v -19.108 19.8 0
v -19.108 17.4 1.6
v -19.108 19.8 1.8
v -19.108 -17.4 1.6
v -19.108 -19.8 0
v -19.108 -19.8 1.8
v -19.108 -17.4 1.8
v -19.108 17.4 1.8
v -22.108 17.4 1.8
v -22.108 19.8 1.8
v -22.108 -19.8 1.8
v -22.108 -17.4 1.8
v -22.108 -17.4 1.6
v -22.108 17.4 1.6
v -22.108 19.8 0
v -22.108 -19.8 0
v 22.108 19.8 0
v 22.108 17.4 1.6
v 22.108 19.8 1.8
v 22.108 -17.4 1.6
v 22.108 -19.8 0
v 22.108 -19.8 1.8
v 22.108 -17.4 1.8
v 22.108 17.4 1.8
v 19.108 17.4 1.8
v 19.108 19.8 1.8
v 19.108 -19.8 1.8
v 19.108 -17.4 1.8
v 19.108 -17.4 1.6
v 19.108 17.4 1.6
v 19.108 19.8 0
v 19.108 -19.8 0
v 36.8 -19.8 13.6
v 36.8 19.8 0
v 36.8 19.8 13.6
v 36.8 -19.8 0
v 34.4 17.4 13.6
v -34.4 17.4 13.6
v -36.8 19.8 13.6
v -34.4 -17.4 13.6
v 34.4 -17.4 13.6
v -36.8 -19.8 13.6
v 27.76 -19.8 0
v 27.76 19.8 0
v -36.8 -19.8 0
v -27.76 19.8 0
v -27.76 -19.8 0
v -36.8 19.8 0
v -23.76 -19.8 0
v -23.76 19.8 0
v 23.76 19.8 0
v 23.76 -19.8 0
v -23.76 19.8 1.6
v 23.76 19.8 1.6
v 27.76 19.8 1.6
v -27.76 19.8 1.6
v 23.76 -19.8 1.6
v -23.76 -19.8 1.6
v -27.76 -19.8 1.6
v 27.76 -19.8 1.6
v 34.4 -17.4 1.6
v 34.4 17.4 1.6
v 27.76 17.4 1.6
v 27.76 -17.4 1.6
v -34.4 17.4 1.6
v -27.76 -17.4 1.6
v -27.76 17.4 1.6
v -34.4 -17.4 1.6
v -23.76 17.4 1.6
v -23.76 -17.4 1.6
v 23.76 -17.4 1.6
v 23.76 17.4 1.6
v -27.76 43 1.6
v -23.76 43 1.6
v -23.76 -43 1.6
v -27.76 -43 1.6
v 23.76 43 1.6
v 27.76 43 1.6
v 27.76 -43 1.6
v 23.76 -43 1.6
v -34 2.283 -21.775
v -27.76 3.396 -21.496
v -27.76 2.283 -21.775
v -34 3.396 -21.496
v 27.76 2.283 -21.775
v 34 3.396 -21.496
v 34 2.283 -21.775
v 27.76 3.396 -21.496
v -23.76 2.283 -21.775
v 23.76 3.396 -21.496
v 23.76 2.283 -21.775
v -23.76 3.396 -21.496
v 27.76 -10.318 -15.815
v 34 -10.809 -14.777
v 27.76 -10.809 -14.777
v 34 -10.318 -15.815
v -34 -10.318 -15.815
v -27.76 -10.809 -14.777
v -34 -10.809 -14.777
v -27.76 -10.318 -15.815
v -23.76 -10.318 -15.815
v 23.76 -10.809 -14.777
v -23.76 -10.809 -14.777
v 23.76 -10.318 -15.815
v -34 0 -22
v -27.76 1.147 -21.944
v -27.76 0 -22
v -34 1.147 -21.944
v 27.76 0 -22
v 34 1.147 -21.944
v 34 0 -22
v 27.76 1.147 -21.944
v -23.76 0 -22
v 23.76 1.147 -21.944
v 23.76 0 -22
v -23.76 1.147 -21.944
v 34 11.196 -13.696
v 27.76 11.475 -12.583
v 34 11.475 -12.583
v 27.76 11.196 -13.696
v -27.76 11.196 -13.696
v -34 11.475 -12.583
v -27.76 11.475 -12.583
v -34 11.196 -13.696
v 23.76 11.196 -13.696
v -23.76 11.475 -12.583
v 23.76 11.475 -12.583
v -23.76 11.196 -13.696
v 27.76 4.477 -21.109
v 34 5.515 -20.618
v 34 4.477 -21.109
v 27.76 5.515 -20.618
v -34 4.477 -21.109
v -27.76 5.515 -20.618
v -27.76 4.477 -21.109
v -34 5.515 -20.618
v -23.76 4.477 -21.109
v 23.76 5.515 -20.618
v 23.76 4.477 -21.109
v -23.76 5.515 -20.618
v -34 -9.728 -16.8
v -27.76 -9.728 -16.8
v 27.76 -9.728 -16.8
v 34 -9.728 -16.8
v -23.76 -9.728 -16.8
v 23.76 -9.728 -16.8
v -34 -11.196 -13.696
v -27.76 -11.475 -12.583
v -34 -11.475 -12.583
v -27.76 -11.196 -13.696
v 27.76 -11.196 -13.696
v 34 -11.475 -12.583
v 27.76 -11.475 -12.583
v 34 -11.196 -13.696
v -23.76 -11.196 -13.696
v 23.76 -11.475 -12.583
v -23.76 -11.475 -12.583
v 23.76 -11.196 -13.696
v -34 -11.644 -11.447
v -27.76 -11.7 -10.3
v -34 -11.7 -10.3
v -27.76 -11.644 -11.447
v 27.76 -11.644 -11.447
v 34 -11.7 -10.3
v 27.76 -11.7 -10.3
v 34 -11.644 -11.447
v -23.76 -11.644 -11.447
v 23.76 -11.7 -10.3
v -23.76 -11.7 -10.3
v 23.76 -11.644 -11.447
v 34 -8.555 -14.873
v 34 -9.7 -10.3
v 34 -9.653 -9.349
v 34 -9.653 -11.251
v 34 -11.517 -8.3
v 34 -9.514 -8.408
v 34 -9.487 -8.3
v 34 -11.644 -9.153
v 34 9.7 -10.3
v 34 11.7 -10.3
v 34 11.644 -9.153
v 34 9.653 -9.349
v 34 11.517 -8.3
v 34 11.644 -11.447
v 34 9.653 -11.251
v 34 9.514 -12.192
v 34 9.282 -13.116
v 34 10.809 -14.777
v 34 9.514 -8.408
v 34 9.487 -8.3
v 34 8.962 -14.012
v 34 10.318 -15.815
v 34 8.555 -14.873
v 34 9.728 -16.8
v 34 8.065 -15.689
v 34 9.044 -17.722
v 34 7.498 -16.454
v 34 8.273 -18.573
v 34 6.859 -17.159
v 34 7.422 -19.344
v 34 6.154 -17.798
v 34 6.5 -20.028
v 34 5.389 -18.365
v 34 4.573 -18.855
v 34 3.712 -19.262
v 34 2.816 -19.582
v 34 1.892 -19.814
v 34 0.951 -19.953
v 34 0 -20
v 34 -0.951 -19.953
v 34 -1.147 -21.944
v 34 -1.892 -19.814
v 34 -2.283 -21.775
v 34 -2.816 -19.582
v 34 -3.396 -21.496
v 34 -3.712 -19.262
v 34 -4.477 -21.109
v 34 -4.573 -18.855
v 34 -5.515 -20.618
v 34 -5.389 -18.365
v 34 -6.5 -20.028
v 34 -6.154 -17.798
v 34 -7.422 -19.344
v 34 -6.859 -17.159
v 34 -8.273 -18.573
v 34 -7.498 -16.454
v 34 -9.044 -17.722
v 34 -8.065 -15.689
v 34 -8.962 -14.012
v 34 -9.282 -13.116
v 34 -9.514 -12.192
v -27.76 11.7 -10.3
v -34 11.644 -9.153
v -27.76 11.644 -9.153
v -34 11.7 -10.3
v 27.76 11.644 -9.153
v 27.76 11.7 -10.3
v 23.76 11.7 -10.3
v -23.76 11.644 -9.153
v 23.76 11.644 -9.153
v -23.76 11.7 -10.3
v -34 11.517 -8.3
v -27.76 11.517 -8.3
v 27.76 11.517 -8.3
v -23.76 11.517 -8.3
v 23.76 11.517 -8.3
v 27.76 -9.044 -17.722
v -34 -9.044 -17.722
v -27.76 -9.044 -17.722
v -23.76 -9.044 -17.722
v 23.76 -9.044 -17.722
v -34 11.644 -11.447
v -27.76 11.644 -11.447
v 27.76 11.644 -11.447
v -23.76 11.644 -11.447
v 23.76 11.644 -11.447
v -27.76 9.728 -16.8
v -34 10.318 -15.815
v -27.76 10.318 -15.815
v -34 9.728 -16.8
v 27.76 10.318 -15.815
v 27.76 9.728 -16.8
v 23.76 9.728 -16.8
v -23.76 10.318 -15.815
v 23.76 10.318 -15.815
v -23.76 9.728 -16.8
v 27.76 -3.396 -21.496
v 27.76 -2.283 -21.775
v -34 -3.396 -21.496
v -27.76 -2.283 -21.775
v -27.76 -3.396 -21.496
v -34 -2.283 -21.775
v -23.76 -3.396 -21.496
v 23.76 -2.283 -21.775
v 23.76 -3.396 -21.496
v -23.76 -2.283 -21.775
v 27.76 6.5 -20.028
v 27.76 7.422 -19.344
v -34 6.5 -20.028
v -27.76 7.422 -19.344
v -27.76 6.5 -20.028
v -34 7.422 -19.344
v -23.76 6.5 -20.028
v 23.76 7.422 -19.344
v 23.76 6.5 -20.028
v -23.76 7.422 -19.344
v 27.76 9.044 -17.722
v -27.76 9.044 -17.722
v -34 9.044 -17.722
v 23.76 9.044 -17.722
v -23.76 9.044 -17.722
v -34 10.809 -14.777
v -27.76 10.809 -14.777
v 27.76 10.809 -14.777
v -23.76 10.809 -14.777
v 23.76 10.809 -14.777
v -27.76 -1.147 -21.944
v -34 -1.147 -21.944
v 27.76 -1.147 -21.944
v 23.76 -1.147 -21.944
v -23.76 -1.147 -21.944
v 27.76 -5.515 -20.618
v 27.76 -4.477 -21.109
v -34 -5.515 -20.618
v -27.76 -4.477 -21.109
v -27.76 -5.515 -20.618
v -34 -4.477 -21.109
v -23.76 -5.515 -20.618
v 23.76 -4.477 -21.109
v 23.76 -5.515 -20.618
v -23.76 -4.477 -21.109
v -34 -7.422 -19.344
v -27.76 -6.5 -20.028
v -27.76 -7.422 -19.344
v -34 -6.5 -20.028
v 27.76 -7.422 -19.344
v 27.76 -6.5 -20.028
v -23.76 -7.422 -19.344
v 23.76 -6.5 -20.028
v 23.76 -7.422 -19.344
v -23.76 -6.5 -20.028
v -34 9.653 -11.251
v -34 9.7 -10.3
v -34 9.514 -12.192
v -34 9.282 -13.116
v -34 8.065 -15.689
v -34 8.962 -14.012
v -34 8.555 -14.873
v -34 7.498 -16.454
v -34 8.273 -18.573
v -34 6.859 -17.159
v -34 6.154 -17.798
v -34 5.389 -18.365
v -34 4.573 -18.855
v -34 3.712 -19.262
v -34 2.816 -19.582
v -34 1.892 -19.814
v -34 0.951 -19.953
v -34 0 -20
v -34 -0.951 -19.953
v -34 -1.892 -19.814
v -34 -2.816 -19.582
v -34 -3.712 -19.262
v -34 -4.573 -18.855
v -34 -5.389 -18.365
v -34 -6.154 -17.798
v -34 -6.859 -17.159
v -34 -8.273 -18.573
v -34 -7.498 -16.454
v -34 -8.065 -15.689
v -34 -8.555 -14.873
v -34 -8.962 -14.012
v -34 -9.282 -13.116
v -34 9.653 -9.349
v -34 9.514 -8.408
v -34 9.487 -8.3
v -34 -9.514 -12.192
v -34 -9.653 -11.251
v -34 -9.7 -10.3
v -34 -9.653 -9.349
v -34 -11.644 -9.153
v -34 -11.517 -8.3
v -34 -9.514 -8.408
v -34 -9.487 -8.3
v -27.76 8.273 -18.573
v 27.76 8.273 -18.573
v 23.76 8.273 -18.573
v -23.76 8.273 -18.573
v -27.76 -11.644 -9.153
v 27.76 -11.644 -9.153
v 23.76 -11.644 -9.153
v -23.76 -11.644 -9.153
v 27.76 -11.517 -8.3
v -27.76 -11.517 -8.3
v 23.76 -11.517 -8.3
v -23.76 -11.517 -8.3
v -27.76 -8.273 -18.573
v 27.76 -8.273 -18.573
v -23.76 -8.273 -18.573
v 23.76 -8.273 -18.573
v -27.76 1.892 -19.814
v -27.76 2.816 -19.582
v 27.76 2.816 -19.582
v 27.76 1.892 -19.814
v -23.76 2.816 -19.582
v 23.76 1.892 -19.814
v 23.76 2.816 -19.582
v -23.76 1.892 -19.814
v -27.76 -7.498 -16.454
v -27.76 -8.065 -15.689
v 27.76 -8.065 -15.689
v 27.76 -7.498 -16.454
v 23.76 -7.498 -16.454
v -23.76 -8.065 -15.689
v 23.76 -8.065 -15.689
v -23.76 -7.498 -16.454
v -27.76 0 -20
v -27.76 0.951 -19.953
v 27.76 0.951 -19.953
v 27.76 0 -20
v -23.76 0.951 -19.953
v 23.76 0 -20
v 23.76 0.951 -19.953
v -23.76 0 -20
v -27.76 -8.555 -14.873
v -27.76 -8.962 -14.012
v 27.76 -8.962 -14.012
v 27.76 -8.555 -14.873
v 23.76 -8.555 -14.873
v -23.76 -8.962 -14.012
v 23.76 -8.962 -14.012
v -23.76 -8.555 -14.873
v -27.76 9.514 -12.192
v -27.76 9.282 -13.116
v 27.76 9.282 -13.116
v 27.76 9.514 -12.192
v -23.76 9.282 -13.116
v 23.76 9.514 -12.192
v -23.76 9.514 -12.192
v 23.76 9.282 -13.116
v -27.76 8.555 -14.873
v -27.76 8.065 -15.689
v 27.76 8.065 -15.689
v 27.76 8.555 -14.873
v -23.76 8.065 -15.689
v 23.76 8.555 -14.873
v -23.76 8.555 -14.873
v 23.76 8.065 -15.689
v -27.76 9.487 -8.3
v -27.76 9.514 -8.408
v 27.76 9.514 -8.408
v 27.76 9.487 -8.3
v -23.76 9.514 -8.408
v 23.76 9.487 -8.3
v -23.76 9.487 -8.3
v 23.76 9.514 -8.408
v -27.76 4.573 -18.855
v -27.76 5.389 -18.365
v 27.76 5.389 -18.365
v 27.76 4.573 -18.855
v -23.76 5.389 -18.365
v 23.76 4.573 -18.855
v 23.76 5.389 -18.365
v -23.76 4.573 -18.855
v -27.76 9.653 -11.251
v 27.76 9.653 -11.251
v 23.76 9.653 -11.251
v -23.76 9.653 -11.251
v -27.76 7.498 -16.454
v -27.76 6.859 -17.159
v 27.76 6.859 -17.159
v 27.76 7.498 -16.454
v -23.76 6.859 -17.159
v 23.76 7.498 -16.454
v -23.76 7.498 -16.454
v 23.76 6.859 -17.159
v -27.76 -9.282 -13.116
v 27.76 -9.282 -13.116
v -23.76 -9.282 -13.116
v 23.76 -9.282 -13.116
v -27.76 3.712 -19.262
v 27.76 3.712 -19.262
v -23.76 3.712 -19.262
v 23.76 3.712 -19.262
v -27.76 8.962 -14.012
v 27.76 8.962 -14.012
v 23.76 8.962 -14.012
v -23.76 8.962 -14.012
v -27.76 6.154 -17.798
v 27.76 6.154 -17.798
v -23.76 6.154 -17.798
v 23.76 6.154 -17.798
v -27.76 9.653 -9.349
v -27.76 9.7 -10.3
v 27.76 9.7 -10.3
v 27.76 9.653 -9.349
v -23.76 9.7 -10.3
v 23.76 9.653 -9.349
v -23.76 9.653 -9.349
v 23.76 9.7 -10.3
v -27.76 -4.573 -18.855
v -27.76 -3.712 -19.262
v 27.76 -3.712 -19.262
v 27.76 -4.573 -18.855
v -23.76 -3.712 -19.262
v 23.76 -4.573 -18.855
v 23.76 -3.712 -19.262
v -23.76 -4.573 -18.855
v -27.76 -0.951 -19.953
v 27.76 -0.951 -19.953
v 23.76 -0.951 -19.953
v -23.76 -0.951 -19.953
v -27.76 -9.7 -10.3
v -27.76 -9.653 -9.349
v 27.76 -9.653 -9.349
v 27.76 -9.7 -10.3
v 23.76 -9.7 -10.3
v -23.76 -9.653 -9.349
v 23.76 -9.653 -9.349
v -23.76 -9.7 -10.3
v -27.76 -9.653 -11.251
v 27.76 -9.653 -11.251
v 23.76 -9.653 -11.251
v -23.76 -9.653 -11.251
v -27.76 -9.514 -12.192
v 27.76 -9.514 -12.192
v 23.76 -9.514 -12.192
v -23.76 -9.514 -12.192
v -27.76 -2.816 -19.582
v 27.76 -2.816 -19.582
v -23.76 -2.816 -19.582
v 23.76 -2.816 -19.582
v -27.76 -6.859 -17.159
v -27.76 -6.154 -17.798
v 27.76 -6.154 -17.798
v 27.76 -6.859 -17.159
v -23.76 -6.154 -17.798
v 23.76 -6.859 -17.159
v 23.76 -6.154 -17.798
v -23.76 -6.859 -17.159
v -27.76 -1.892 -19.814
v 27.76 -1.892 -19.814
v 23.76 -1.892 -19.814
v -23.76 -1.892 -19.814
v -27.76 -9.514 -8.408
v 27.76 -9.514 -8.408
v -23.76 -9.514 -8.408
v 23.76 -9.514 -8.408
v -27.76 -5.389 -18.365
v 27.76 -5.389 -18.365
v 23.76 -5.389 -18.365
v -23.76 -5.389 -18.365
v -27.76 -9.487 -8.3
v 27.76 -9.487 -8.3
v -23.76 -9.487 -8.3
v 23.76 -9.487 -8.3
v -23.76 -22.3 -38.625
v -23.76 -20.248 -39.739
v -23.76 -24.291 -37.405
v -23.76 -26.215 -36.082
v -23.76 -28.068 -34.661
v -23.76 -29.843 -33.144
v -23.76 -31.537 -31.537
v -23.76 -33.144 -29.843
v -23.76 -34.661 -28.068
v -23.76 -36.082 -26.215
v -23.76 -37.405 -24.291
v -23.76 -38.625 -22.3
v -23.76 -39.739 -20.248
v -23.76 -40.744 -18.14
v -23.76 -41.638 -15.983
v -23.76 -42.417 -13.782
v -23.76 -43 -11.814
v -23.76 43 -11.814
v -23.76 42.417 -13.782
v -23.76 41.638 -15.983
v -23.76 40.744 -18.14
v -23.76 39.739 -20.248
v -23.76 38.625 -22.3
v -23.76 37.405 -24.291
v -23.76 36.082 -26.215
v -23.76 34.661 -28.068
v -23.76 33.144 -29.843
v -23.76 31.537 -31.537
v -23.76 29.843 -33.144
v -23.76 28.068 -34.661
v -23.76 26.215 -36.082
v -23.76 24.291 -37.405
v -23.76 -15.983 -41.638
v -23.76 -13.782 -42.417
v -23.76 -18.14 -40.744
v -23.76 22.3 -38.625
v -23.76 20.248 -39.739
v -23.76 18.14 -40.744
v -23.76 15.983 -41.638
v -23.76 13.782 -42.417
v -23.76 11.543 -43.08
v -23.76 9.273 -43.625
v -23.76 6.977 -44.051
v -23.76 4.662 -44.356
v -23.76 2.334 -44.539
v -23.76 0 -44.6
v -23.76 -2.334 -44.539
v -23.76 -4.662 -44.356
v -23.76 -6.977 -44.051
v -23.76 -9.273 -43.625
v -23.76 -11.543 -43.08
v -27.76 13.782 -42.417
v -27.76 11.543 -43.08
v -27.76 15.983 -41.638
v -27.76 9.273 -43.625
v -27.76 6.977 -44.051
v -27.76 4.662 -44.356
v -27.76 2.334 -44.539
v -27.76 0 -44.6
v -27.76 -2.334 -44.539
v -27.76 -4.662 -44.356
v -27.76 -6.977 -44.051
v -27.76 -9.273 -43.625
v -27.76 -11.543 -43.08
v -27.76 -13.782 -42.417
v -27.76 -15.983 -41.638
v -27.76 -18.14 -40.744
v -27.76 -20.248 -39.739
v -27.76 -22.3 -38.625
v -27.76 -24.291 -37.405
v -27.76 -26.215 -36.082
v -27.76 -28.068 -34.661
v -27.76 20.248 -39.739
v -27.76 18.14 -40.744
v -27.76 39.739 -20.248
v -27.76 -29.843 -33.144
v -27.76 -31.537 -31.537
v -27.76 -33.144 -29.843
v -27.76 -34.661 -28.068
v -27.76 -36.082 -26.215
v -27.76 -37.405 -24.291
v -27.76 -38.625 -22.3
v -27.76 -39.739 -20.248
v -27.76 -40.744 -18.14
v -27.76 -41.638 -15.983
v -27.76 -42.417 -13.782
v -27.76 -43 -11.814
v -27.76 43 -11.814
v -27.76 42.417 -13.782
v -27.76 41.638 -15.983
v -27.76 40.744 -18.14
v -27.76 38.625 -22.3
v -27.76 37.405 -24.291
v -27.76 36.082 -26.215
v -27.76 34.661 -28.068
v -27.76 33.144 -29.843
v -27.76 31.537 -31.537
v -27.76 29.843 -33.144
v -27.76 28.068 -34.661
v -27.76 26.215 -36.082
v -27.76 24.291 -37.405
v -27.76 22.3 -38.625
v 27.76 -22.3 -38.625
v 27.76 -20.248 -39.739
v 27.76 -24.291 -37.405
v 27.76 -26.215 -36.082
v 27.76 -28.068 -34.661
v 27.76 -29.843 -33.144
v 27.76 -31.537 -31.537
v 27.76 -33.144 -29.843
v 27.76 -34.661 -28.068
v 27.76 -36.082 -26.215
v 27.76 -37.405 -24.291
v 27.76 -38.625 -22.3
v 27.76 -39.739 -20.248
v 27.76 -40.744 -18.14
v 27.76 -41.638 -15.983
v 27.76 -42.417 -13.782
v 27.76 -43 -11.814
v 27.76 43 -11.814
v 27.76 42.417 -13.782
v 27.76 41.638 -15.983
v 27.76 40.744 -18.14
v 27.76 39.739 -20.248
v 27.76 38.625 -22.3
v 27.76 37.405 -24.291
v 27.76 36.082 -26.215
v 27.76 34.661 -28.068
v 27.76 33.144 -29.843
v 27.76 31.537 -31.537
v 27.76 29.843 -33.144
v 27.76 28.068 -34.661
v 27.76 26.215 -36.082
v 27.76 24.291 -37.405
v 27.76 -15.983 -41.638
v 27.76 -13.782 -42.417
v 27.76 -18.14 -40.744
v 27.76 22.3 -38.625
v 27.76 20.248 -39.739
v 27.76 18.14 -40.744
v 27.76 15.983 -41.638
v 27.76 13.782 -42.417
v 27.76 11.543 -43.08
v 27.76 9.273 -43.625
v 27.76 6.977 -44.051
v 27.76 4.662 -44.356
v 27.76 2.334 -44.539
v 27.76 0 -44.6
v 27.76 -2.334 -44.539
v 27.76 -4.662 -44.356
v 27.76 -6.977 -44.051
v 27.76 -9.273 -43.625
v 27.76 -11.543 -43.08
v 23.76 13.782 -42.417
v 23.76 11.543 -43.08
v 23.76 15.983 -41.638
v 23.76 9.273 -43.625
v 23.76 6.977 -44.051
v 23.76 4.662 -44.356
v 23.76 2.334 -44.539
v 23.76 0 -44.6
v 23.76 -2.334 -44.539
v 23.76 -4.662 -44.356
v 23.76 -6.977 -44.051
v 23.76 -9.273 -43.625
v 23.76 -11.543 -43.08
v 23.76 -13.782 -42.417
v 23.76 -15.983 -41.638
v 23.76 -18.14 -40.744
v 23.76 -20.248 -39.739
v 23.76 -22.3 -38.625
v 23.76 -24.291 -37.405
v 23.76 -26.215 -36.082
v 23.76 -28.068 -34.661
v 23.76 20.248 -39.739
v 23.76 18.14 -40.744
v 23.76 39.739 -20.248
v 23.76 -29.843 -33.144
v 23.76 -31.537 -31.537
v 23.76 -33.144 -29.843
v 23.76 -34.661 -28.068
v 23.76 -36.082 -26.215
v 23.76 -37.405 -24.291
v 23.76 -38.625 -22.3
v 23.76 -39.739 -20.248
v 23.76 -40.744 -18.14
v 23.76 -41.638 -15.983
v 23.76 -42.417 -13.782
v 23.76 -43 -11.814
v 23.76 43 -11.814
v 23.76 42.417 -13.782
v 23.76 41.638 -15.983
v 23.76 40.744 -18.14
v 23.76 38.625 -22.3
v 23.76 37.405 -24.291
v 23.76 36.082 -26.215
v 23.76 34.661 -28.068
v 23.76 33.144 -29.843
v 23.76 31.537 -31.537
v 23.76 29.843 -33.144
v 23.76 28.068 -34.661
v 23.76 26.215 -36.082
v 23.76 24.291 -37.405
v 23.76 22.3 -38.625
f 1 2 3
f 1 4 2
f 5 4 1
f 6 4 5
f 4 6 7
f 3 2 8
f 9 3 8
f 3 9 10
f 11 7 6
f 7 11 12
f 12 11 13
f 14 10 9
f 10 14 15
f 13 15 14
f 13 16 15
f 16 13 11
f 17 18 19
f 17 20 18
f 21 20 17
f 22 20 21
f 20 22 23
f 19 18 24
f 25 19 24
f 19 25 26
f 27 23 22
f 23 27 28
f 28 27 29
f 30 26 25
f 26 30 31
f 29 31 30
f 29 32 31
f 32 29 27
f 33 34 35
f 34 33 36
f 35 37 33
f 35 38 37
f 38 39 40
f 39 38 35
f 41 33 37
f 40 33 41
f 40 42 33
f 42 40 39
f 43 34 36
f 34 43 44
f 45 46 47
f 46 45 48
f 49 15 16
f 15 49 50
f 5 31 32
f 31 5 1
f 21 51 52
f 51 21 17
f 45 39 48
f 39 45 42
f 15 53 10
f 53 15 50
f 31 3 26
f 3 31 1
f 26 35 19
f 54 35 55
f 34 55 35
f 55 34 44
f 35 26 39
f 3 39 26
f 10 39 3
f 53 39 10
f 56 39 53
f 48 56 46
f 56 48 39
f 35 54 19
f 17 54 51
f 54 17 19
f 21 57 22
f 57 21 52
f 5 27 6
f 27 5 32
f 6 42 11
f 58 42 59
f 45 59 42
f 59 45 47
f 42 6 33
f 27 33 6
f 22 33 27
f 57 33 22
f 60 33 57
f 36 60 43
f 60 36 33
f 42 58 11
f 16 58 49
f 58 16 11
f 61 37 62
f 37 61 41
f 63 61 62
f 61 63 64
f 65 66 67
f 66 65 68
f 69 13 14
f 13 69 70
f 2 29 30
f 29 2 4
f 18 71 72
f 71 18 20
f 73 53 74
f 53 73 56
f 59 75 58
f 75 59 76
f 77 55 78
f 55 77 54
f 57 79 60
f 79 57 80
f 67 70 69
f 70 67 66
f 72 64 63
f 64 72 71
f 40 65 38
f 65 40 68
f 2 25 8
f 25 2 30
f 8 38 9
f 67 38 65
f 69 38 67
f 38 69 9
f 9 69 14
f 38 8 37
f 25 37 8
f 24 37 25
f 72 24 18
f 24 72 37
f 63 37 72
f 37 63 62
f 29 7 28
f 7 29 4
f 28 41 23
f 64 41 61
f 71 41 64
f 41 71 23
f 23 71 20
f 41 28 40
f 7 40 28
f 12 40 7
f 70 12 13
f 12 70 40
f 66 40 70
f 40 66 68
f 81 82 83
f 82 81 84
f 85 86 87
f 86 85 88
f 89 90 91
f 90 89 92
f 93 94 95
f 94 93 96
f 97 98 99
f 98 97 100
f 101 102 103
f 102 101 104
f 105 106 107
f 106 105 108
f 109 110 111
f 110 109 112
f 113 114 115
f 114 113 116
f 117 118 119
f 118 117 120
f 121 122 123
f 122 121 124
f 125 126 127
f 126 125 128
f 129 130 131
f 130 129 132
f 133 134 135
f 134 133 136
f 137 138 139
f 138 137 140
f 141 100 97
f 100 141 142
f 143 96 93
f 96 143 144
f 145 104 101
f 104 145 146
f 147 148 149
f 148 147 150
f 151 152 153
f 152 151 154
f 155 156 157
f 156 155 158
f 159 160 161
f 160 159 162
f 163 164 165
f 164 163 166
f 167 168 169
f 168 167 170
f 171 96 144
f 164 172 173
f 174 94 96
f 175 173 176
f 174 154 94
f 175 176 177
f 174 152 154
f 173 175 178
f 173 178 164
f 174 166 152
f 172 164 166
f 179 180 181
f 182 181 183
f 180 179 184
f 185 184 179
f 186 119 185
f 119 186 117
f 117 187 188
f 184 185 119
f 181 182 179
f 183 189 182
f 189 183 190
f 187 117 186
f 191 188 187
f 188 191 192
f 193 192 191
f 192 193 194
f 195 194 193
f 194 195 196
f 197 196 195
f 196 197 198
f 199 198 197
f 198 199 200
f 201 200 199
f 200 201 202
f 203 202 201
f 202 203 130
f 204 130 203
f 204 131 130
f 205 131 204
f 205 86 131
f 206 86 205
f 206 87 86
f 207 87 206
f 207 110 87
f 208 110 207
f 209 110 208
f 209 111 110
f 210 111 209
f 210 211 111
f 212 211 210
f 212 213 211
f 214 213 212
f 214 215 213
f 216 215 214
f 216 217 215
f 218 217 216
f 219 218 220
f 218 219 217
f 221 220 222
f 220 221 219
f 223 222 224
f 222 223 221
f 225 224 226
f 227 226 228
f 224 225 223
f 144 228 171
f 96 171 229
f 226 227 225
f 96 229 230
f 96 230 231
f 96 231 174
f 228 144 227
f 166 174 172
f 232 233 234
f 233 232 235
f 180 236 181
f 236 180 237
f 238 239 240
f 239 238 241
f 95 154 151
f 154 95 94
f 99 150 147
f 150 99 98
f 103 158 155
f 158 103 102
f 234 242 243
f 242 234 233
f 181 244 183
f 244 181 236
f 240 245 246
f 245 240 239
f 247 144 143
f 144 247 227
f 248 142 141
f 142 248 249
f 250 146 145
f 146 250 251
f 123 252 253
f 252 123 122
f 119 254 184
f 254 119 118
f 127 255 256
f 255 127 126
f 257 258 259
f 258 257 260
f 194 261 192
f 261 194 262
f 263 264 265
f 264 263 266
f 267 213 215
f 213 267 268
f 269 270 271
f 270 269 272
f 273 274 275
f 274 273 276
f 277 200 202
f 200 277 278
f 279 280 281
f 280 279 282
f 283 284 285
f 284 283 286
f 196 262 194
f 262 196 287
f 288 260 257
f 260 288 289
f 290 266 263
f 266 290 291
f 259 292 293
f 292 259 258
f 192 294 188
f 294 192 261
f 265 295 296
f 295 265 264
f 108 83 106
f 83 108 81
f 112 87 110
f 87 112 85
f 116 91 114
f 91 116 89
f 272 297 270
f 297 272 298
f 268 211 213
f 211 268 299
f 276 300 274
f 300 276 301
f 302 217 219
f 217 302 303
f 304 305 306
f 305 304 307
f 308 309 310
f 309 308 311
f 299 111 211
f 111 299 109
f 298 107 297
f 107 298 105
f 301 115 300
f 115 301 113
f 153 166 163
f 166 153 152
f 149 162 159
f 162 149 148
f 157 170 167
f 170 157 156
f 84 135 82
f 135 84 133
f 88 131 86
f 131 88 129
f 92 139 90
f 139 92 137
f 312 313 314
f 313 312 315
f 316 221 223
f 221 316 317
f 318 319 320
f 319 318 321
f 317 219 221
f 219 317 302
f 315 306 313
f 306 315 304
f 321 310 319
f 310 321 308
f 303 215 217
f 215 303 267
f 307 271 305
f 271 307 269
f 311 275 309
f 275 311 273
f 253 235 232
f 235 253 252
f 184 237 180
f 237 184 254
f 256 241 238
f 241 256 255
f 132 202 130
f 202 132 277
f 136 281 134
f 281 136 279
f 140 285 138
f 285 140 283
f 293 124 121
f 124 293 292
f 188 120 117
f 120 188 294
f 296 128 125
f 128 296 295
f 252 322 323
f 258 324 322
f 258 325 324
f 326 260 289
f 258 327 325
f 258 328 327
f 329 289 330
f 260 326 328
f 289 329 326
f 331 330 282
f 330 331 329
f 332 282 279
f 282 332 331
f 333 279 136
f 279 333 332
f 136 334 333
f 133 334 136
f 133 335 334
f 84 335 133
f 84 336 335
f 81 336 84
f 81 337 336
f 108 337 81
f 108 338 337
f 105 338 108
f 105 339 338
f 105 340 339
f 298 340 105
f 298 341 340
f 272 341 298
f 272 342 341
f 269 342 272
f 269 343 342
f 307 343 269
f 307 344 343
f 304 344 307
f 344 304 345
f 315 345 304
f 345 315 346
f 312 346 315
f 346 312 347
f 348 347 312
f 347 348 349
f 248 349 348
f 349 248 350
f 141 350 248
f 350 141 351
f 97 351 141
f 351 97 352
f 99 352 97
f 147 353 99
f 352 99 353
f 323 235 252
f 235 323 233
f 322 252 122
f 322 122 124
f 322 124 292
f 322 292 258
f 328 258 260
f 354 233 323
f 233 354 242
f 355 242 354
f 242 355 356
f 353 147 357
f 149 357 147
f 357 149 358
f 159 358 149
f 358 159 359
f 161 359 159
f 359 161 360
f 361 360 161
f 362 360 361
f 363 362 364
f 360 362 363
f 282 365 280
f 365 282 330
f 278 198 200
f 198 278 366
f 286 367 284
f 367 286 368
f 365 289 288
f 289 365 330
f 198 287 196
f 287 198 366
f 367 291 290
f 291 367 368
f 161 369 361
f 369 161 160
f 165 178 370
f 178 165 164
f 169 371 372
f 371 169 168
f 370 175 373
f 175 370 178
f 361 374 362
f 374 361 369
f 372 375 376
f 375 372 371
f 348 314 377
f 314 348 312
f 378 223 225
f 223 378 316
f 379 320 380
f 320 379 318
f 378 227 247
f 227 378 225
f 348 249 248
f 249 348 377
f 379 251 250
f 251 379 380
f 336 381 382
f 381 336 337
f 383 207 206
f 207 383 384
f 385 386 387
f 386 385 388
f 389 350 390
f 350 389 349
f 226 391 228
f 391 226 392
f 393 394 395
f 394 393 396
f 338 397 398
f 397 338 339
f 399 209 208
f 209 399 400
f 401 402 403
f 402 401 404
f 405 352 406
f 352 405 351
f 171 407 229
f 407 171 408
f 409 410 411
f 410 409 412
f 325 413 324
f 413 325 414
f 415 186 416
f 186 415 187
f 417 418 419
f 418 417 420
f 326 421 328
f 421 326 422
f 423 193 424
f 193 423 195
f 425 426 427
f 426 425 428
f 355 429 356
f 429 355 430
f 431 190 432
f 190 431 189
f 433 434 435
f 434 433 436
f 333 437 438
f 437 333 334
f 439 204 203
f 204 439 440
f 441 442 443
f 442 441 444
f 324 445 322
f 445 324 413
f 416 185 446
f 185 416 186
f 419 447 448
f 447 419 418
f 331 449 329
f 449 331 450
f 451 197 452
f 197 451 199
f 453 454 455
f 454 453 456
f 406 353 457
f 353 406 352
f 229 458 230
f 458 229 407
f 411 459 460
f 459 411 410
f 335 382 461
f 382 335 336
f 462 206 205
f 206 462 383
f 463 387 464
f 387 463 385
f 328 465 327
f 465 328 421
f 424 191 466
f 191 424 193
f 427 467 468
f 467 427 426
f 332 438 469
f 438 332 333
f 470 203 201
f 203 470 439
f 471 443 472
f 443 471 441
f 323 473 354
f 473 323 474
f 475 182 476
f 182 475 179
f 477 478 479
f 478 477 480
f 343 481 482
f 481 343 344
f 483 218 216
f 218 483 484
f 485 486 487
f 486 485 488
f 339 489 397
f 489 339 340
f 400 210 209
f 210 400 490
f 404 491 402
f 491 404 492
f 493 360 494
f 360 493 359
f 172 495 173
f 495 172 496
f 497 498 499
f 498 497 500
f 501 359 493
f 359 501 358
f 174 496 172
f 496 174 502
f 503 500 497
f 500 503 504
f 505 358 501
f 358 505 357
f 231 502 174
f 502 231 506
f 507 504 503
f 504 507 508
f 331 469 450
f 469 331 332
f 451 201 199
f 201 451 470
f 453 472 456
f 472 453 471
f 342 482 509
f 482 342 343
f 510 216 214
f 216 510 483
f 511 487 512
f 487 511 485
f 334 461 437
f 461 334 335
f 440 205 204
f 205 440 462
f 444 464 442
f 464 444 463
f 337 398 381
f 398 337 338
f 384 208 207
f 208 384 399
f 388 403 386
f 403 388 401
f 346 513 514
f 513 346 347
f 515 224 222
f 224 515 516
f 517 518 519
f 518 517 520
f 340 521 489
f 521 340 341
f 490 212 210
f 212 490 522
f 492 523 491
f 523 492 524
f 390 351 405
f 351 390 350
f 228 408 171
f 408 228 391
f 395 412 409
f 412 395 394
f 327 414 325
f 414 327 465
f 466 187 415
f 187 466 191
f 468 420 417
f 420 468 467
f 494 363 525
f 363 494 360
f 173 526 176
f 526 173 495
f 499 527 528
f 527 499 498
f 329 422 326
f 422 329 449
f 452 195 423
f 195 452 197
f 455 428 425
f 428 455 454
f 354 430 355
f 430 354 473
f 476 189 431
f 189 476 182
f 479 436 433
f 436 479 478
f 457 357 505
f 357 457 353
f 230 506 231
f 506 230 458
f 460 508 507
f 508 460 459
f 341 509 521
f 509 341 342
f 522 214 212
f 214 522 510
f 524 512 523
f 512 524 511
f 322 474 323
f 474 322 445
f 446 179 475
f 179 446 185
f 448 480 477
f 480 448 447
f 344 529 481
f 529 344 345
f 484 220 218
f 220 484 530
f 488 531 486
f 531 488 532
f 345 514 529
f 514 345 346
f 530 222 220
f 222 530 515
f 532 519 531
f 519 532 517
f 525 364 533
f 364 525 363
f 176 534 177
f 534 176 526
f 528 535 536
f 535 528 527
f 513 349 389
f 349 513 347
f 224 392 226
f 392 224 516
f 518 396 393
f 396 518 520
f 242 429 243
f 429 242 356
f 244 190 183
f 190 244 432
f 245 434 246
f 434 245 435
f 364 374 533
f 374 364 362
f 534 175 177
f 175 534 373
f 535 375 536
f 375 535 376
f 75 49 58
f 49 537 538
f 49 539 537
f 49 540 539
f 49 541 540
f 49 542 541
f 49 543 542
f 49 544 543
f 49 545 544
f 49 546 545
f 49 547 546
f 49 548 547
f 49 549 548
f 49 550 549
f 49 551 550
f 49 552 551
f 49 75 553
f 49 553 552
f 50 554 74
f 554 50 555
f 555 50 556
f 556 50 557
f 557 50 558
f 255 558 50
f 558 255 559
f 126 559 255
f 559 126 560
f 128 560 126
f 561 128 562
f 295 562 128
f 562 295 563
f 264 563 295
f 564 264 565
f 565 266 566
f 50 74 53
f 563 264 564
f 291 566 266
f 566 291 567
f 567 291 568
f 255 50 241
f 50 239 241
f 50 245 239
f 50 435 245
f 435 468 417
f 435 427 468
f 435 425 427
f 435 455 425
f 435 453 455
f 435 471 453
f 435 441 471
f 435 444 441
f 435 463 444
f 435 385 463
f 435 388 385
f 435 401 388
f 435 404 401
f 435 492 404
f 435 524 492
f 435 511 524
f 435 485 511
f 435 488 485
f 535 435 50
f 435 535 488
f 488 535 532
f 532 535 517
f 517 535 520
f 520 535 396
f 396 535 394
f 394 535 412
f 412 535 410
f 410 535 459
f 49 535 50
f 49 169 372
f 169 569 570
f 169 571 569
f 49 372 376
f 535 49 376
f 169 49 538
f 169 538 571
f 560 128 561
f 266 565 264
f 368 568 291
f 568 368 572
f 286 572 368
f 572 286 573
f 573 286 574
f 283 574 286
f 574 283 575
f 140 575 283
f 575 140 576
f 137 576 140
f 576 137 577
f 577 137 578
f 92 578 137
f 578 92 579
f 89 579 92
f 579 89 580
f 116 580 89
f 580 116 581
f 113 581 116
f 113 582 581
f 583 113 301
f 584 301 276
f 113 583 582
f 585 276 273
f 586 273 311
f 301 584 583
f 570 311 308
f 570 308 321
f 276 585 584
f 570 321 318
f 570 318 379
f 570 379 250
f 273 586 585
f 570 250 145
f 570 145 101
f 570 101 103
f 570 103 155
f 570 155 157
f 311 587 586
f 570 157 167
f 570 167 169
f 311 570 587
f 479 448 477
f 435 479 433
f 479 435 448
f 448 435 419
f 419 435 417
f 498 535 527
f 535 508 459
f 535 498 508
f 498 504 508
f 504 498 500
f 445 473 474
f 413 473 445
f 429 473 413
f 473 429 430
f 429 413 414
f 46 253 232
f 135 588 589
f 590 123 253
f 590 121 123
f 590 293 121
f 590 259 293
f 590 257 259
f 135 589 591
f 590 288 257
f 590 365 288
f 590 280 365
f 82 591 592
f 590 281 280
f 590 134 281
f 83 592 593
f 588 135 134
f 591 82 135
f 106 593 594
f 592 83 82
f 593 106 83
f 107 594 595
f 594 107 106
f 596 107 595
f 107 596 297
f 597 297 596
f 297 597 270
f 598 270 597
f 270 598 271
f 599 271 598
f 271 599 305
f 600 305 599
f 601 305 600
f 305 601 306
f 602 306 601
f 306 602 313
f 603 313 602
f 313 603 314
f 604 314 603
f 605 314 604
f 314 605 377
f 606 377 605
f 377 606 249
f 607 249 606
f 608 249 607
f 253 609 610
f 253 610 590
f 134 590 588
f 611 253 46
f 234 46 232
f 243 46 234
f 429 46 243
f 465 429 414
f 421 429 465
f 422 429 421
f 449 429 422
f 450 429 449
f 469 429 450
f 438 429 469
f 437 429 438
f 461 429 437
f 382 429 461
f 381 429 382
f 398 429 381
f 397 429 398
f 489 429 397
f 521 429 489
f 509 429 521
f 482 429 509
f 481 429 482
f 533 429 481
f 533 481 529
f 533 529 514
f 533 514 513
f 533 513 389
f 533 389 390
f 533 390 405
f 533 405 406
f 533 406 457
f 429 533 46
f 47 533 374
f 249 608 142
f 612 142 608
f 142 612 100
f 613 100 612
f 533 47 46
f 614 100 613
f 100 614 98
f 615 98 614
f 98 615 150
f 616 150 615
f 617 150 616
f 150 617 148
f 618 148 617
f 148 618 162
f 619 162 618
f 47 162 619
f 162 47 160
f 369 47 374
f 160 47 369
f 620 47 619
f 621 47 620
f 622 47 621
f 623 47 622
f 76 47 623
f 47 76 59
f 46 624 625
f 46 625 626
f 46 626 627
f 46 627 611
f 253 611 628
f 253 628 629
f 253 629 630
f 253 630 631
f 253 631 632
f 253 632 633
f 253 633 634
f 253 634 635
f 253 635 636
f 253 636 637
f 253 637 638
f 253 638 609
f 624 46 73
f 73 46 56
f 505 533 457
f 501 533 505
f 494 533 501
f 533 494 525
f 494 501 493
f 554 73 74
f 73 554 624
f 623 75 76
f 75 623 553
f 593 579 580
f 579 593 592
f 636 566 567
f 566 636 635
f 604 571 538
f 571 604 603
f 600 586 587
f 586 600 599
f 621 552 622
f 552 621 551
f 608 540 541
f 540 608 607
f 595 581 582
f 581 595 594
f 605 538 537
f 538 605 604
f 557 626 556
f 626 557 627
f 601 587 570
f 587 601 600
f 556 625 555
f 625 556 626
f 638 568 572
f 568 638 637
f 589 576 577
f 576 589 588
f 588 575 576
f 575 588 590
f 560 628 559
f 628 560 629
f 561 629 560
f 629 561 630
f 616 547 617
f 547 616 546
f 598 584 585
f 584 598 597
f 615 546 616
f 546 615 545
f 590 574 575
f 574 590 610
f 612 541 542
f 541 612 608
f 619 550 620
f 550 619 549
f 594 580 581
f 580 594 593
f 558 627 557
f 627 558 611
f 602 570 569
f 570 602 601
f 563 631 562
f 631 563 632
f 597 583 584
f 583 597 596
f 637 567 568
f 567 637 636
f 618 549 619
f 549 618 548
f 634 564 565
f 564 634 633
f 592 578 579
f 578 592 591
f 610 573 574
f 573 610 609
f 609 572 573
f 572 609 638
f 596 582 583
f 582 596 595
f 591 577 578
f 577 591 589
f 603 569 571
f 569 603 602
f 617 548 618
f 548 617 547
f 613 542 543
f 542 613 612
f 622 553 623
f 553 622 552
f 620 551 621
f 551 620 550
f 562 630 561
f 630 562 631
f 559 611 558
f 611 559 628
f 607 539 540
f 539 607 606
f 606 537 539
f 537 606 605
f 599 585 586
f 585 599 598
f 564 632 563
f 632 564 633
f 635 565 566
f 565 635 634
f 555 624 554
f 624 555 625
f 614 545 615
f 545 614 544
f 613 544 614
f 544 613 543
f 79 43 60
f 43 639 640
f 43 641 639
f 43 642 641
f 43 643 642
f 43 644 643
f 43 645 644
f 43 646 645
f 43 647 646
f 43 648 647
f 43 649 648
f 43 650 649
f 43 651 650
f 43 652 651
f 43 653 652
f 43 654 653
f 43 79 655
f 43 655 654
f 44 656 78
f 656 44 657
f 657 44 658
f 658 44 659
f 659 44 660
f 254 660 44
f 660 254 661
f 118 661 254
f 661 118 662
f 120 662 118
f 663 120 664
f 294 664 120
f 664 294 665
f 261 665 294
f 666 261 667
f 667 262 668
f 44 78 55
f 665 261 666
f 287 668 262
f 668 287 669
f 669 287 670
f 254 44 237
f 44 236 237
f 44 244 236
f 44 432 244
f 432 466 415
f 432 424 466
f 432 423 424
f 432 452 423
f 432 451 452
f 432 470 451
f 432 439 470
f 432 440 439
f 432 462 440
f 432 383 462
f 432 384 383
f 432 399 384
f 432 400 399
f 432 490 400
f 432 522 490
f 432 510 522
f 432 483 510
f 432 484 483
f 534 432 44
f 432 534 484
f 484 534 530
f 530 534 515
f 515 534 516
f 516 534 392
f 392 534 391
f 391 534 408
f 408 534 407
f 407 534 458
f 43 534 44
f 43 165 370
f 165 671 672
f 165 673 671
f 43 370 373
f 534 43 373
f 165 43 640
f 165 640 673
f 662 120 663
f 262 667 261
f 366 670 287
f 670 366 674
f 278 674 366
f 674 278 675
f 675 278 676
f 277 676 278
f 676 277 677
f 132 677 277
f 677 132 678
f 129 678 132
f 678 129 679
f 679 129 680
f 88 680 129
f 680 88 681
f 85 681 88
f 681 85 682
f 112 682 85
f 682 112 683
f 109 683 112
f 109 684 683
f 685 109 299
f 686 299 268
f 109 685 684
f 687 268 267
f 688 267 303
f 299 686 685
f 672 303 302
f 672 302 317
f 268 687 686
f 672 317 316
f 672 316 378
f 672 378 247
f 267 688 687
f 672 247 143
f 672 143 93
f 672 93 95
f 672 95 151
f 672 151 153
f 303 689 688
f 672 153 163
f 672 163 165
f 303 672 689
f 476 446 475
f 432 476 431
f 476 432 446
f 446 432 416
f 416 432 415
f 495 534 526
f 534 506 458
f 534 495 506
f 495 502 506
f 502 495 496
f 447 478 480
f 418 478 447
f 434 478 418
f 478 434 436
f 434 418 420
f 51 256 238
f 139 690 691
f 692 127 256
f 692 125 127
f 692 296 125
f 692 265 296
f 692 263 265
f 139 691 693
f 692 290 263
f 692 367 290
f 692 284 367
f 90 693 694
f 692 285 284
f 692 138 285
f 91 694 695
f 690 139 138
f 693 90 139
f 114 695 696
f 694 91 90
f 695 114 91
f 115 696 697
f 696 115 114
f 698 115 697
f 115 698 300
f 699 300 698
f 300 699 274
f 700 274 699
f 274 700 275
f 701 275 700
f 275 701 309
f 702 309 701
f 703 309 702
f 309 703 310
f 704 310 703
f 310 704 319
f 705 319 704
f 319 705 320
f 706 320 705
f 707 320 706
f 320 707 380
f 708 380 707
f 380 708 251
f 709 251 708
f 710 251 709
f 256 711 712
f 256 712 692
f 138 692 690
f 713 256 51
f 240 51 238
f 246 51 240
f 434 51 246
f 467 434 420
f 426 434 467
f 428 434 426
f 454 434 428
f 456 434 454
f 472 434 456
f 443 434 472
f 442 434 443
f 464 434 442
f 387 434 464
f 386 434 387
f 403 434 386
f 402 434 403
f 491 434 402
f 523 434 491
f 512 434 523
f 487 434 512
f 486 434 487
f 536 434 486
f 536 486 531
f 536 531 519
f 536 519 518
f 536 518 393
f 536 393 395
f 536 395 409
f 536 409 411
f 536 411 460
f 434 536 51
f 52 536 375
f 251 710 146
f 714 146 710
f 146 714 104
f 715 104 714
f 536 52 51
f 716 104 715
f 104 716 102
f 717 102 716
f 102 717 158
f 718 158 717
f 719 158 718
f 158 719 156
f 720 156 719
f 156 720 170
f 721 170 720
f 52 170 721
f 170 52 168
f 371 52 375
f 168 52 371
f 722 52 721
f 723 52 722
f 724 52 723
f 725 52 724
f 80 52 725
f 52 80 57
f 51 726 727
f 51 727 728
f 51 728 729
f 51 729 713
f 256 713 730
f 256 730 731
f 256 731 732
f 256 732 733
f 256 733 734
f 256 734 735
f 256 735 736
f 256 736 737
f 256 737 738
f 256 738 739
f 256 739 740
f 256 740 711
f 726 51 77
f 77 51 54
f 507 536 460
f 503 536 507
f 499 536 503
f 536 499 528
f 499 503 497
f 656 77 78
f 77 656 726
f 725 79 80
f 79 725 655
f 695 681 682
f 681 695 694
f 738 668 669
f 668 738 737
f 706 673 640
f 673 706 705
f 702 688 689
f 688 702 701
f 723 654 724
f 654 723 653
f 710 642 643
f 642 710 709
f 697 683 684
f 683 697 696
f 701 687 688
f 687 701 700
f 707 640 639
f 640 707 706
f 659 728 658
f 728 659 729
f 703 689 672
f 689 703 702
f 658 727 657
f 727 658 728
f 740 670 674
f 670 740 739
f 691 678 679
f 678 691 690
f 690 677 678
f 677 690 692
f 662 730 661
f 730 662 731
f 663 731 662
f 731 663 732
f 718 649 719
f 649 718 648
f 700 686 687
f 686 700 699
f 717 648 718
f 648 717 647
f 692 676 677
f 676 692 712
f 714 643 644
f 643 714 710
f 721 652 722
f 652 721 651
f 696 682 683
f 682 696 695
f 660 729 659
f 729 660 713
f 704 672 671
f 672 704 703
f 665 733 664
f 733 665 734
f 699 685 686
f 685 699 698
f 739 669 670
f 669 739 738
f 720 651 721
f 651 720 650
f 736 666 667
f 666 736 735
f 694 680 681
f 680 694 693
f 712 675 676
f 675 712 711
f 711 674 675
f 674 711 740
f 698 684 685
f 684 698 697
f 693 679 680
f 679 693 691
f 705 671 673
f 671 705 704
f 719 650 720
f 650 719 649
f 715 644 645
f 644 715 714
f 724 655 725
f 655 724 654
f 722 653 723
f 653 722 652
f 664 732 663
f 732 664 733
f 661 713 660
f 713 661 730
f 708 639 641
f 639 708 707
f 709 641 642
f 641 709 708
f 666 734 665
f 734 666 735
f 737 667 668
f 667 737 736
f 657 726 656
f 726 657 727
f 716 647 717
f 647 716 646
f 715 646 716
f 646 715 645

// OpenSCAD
// file: mockups.scad
// Friendly Floaty — real-size visual mockups (NOT printed parts)
// Dimensional stand-ins for the full assembly view: bottle, LILYGO board, 18650,
// ballast pack, antennas. Sizes from params.scad / BOM; measure YOUR parts and adjust.
// Axes: X = bottle long axis (+X = cap/neck), +Z = up (antenna side).
include <params.scad>

module bottle_mock() {
    // thin shell so the viewer can look inside (visual wall 1 mm)
    x1 = bottle_body_x0 + bottle_body_l;                 // body end (+X)
    rotate([0, 90, 0]) translate([0, 0, 0]) union() {
        // body shell: local +z = global +X
        translate([0, 0, bottle_body_x0]) difference() {
            cylinder(h = bottle_body_l, d = bottle_id + 2, $fn = 96);
            translate([0, 0, -1]) cylinder(h = bottle_body_l + 2, d = bottle_id, $fn = 96);
        }
        // base cap (slightly domed, closed)
        translate([0, 0, bottle_body_x0 - 1]) cylinder(h = 2, d = bottle_id + 2, $fn = 96);
        // shoulder taper to neck
        translate([0, 0, x1]) difference() {
            cylinder(h = shoulder_l, d1 = bottle_id + 2, d2 = cap_d - 4, $fn = 96);
            translate([0, 0, -1]) cylinder(h = shoulder_l + 2, d1 = bottle_id, d2 = cap_d - 6, $fn = 96);
        }
        // neck + cap
        translate([0, 0, x1 + shoulder_l]) cylinder(h = neck_l, d = cap_d, $fn = 64);
    }
}

module board_mock() {
    // LILYGO T-A7670G R2: PCB + component block, sits in the bracket tray (floor z=1.6)
    union() {
        translate([-board_l/2, -board_w/2, 1.6]) cube([board_l, board_w, 1.6]);         // PCB
        translate([-board_l/2 + 4, -board_w/2 + 3, 3.2]) cube([board_l - 8, board_w - 6, board_h - 4]); // parts
    }
}

module antennas_mock() {
    // taped to the upper inner wall: LTE FPC stick + GNSS patch (visual)
    translate([-45, -6, 34]) cube([70, 12, 2]);           // LTE FPC
    translate([18, -12.5, 33]) cube([25, 25, 7]);         // GNSS patch
}

module cell_mock() {
    // protected 18650 in the C-holder under the tray (axis along X)
    translate([0, 0, -(cell_d/2 + 1)]) rotate([0, 90, 0])
        cylinder(h = cell_l, d = cell_d, center = true, $fn = 48);
}

module ballast_mock() {
    // lead-free weight pack filling the keel pocket (~40 g steel)
    translate([-ballast_l/2, -ballast_w/2, -bottle_r + wall])
        cube([ballast_l, ballast_w, 14]);
}
// file: foam_collar.scad
// Friendly Floaty — foam collar (flooded-reserve primary buoyancy)
// The part that keeps a FLOODED unit afloat (RELIABILITY.md §4: 2 collars = ~160 cm^3
// closed-cell EVA/EPE -> +27.5% flooded reserve). NOT 3D-printed: this model is the
// CUT MASTER for EVA sheet stacking/heat-forming (print once as a template if useful).
// Axes: X = bottle long axis. Payload channel W70(Y) x H40(Z), centered 4 mm low so the
// bracket tray + cell holder pass through; the keel passes under via the channel.
include <params.scad>

module _rrect(w_z, w_y, r) {
    // rounded rect in the local XY plane of the rotated frame:
    // local x -> global -Z (height w_z), local y -> global Y (width w_y)
    hull() for (x = [-w_z/2 + r, w_z/2 - r]) for (y = [-w_y/2 + r, w_y/2 - r])
        translate([x, y]) circle(r = r, $fn = 32);
}

module foam_collar() {
    rotate([0, 90, 0]) difference() {
        cylinder(h = collar_t, d = foam_od, center = true, $fn = 96);
        // payload channel, centered 4 mm below the bottle axis (local +x = global -Z)
        translate([4, 0, 0])
            linear_extrude(collar_t + 2, center = true)
                _rrect(foam_bore_w, foam_bore_l, 6);
    }
}

foam_collar();
// file: recovery_loop.scad
// SEA:CUT / Friendly Floatee — recovery loop
// A smooth closed loop for pole/net recovery. No sharp edges or open hooks, so it
// will not entangle wildlife or snag nets and propellers. Glue/screw to the top.
include <params.scad>

loop_r = 18;   // loop radius
loop_cs = 4;   // loop cross-section radius (smooth, rounded)
base_l = 30;
base_w = 16;
base_t = 3;

module torus(R, cs) rotate_extrude($fn = 72) translate([R, 0, 0]) circle(r = cs, $fn = 24);

module recovery_loop() {
    difference() {
        union() {
            // rounded base plate
            hull() for (x = [-base_l/2 + 4, base_l/2 - 4]) for (y = [-base_w/2 + 4, base_w/2 - 4])
                translate([x, y, 0]) cylinder(h = base_t, r = 4, $fn = 32);
            // upright smooth loop
            translate([0, 0, base_t + loop_r]) rotate([90, 0, 0]) torus(loop_r, loop_cs);
        }
        // mounting holes
        for (x = [-base_l/2 + 5, base_l/2 - 5])
            translate([x, 0, -1]) cylinder(h = base_t + 2, r = 1.8, $fn = 24);
    }
}

recovery_loop();
// file: ballast_keel.scad
// SEA:CUT / Friendly Floatee — ballast keel (self-righting)
// Seats at the belly (-Z) and carries lead-free weight low, so the float always
// rights itself antenna-up no matter how it rolls.
// Axes: X = bottle long axis, -Z = belly.
include <params.scad>

module ballast_keel() {
    Lx = ballast_l + 2*wall;
    Wy = ballast_w + 2*wall;
    Hz = bottle_r * 0.5;
    difference() {
        // slab at the belly, trimmed to the bottle inner wall
        intersection() {
            translate([-Lx/2, -Wy/2, -bottle_r]) cube([Lx, Wy, Hz]);
            rotate([0, 90, 0]) cylinder(h = Lx + 4, r = bottle_r - clr, center = true, $fn = 120);
        }
        // open weight pocket (pack with lead-free sinkers, then seal)
        translate([-ballast_l/2, -ballast_w/2, -bottle_r + wall]) cube([ballast_l, ballast_w, Hz]);
        // zip-tie / drain holes
        for (x = [-Lx*0.32, Lx*0.32])
            translate([x, 0, -bottle_r - 1]) cylinder(h = Hz + 2, r = 1.8, $fn = 24);
    }
}

ballast_keel();
// file: electronics_bracket.scad
// SEA:CUT / Friendly Floatee — electronics bracket
// Holds the LILYGO T-A7670G board and the 18650 cell, self-locating in the bottle.
// Axes: X = bottle long axis, +Z = up (antenna side), -Z = belly.
include <params.scad>

module cell_holder() {
    // C-channel snap holder for one 18650, along X, opening up
    difference() {
        rotate([0, 90, 0]) cylinder(h = cell_l, r = cell_d/2 + wall, center = true);
        rotate([0, 90, 0]) cylinder(h = cell_l + 2, r = cell_d/2 + clr, center = true);
        translate([-cell_l/2 - 1, -(cell_d/2 + wall + 1), 2])
            cube([cell_l + 2, cell_d + 2*wall + 2, cell_d]);
    }
}

module electronics_bracket() {
    bl = board_l + 2*wall + 2*clr;
    bw = board_w + 2*wall + 2*clr;
    ft = 1.6;
    union() {
        // open board tray
        difference() {
            translate([-bl/2, -bw/2, 0]) cube([bl, bw, ft + board_h]);
            translate([-bl/2 + wall, -bw/2 + wall, ft])
                cube([bl - 2*wall, bw - 2*wall, board_h + 1]);
            // zip-tie slots
            for (x = [-bl*0.28, bl*0.28])
                translate([x - 1.5, -bw/2 - 1, -1]) cube([3, bw + 2, ft + 1.2]);
        }
        // battery holder under the tray
        translate([0, 0, -cell_d/2 - 1]) cell_holder();
        // two curved locating ribs to seat in the bottle wall
        for (x = [-bl*0.35, bl*0.35])
            intersection() {
                translate([x - 2, -bottle_r + 2, -bottle_r]) cube([4, 2*bottle_r - 4, bottle_r + ft]);
                rotate([0, 90, 0]) cylinder(h = bl*2, r = bottle_r - clr, center = true, $fn = 120);
            }
    }
}

electronics_bracket();
// file: params.scad
// SEA:CUT / Friendly Floatee drifter — shared parameters (mm)
// Hardware: CERN-OHL-P. Docs: CC BY 4.0. Firmware: MIT.
// MEASURE YOUR OWN BOTTLE and edit these. Defaults approximate a 1 L round PET bottle.

// --- bottle (upcycled PET) ---
bottle_id = 90;            // bottle inner diameter
bottle_r  = bottle_id / 2; // derived inner radius

// --- printing ---
wall = 2.4;                // printed wall thickness
clr  = 0.4;                // fit clearance
$fn  = 64;                 // curve smoothness

// --- LILYGO T-A7670G board (approximate, incl. headers) ---
board_l = 68;
board_w = 34;
board_h = 12;

// --- 18650 protected cell ---
cell_d = 18.6;
cell_l = 68;

// --- lead-free ballast pocket (self-righting weight) ---
ballast_l = 55;
ballast_w = 22;

// --- flotation & hydrostatics (NEW; estimates — verify per build; see hardware/RELIABILITY.md) ---
// Sealed 1 L bottle displaces ~1000 cm^3 -> reserve ratio ~4.83x (never sinks intact).
// Real failure = seal leak -> flooded net buoyancy ~ -97 gf -> sinks. Foam reverses it.
foam_vol             = 160;   // cm^3 closed-cell foam (flooded reserve; non-BOM NEW part)
foam_density         = 0.04;  // g/cm^3 EVA/EPE estimate (range 0.03-0.05)
reserve_ratio_target = 1.25;  // flooded: (disp/mass) >= this  (PASS >= 1.20)
sealed_reserve_min   = 3.0;   // sealed: 1000cm3/mass >= this (design ~4.83)
freeboard_min        = 30;    // mm minimum calm-water freeboard
ballast_mass_g       = 40;    // tuning var; +10 g ballast needs +~11.7 cm^3 foam
// foam collar geometry (NEW part, cut/heat-formed EVA sheet — .scad is the cut master)
foam_od     = 86;             // mm, fits inside bottle_id=90 with margin
foam_bore_l = board_l + 2;    // ~70 mm payload channel (board_l=68)
foam_bore_w = board_w + 6;    // ~40 mm (board_w=34)
foam_area   = PI*pow(foam_od/2,2)/100 - (foam_bore_l*foam_bore_w)/100; // ~30.1 cm^2
foam_collar_h = foam_vol / foam_area;   // ~53 mm; split into 2 x ~27 mm
// prints: measured STL solid volume = 56.9 cm^3 (bracket 40.4 + keel 9.95 + loop 6.57)
print_infill_max = 0.60;  // keep <=60% -> foam_vol 160 holds; solid(100%) needs ~175

// --- full assembly (real size; visual mocks measure YOUR parts) ---
collar_t   = 27;          // foam collar thickness (2 pieces = foam_collar_h ~53)
collar_x   = 44.5;        // collar center offset +-X (clears keel ends at +-29.9)
bottle_body_l = 190;      // straight body length of a ~1 L bottle (mock)
bottle_body_x0 = -100;    // body from x0 to x0+bottle_body_l; neck/cap at +X
shoulder_l = 22;          // taper body -> neck
neck_l     = 18;          // neck + cap
cap_d      = 31;          // cap outer diameter
// main file
// Friendly Floaty — per-part STL export in ASSEMBLED coordinates (for the web viewer)
//   openscad -o out/<name>.stl -D part="<name>" export_part.scad
// names: bracket keel loop foam_a foam_b board antennas cell ballast bottle
include <params.scad>
use <electronics_bracket.scad>
use <ballast_keel.scad>
use <recovery_loop.scad>
use <foam_collar.scad>
use <mockups.scad>

part = "bracket";

if (part == "bracket")       electronics_bracket();
else if (part == "keel")     ballast_keel();
else if (part == "loop")     translate([0, 0, bottle_r + 1]) recovery_loop();
else if (part == "foam_a")   translate([ collar_x, 0, 0]) foam_collar();
else if (part == "foam_b")   translate([-collar_x, 0, 0]) foam_collar();
else if (part == "board")    board_mock();
else if (part == "antennas") antennas_mock();
else if (part == "cell")     cell_mock();
else if (part == "ballast")  ballast_mock();
else if (part == "bottle")   bottle_mock();
